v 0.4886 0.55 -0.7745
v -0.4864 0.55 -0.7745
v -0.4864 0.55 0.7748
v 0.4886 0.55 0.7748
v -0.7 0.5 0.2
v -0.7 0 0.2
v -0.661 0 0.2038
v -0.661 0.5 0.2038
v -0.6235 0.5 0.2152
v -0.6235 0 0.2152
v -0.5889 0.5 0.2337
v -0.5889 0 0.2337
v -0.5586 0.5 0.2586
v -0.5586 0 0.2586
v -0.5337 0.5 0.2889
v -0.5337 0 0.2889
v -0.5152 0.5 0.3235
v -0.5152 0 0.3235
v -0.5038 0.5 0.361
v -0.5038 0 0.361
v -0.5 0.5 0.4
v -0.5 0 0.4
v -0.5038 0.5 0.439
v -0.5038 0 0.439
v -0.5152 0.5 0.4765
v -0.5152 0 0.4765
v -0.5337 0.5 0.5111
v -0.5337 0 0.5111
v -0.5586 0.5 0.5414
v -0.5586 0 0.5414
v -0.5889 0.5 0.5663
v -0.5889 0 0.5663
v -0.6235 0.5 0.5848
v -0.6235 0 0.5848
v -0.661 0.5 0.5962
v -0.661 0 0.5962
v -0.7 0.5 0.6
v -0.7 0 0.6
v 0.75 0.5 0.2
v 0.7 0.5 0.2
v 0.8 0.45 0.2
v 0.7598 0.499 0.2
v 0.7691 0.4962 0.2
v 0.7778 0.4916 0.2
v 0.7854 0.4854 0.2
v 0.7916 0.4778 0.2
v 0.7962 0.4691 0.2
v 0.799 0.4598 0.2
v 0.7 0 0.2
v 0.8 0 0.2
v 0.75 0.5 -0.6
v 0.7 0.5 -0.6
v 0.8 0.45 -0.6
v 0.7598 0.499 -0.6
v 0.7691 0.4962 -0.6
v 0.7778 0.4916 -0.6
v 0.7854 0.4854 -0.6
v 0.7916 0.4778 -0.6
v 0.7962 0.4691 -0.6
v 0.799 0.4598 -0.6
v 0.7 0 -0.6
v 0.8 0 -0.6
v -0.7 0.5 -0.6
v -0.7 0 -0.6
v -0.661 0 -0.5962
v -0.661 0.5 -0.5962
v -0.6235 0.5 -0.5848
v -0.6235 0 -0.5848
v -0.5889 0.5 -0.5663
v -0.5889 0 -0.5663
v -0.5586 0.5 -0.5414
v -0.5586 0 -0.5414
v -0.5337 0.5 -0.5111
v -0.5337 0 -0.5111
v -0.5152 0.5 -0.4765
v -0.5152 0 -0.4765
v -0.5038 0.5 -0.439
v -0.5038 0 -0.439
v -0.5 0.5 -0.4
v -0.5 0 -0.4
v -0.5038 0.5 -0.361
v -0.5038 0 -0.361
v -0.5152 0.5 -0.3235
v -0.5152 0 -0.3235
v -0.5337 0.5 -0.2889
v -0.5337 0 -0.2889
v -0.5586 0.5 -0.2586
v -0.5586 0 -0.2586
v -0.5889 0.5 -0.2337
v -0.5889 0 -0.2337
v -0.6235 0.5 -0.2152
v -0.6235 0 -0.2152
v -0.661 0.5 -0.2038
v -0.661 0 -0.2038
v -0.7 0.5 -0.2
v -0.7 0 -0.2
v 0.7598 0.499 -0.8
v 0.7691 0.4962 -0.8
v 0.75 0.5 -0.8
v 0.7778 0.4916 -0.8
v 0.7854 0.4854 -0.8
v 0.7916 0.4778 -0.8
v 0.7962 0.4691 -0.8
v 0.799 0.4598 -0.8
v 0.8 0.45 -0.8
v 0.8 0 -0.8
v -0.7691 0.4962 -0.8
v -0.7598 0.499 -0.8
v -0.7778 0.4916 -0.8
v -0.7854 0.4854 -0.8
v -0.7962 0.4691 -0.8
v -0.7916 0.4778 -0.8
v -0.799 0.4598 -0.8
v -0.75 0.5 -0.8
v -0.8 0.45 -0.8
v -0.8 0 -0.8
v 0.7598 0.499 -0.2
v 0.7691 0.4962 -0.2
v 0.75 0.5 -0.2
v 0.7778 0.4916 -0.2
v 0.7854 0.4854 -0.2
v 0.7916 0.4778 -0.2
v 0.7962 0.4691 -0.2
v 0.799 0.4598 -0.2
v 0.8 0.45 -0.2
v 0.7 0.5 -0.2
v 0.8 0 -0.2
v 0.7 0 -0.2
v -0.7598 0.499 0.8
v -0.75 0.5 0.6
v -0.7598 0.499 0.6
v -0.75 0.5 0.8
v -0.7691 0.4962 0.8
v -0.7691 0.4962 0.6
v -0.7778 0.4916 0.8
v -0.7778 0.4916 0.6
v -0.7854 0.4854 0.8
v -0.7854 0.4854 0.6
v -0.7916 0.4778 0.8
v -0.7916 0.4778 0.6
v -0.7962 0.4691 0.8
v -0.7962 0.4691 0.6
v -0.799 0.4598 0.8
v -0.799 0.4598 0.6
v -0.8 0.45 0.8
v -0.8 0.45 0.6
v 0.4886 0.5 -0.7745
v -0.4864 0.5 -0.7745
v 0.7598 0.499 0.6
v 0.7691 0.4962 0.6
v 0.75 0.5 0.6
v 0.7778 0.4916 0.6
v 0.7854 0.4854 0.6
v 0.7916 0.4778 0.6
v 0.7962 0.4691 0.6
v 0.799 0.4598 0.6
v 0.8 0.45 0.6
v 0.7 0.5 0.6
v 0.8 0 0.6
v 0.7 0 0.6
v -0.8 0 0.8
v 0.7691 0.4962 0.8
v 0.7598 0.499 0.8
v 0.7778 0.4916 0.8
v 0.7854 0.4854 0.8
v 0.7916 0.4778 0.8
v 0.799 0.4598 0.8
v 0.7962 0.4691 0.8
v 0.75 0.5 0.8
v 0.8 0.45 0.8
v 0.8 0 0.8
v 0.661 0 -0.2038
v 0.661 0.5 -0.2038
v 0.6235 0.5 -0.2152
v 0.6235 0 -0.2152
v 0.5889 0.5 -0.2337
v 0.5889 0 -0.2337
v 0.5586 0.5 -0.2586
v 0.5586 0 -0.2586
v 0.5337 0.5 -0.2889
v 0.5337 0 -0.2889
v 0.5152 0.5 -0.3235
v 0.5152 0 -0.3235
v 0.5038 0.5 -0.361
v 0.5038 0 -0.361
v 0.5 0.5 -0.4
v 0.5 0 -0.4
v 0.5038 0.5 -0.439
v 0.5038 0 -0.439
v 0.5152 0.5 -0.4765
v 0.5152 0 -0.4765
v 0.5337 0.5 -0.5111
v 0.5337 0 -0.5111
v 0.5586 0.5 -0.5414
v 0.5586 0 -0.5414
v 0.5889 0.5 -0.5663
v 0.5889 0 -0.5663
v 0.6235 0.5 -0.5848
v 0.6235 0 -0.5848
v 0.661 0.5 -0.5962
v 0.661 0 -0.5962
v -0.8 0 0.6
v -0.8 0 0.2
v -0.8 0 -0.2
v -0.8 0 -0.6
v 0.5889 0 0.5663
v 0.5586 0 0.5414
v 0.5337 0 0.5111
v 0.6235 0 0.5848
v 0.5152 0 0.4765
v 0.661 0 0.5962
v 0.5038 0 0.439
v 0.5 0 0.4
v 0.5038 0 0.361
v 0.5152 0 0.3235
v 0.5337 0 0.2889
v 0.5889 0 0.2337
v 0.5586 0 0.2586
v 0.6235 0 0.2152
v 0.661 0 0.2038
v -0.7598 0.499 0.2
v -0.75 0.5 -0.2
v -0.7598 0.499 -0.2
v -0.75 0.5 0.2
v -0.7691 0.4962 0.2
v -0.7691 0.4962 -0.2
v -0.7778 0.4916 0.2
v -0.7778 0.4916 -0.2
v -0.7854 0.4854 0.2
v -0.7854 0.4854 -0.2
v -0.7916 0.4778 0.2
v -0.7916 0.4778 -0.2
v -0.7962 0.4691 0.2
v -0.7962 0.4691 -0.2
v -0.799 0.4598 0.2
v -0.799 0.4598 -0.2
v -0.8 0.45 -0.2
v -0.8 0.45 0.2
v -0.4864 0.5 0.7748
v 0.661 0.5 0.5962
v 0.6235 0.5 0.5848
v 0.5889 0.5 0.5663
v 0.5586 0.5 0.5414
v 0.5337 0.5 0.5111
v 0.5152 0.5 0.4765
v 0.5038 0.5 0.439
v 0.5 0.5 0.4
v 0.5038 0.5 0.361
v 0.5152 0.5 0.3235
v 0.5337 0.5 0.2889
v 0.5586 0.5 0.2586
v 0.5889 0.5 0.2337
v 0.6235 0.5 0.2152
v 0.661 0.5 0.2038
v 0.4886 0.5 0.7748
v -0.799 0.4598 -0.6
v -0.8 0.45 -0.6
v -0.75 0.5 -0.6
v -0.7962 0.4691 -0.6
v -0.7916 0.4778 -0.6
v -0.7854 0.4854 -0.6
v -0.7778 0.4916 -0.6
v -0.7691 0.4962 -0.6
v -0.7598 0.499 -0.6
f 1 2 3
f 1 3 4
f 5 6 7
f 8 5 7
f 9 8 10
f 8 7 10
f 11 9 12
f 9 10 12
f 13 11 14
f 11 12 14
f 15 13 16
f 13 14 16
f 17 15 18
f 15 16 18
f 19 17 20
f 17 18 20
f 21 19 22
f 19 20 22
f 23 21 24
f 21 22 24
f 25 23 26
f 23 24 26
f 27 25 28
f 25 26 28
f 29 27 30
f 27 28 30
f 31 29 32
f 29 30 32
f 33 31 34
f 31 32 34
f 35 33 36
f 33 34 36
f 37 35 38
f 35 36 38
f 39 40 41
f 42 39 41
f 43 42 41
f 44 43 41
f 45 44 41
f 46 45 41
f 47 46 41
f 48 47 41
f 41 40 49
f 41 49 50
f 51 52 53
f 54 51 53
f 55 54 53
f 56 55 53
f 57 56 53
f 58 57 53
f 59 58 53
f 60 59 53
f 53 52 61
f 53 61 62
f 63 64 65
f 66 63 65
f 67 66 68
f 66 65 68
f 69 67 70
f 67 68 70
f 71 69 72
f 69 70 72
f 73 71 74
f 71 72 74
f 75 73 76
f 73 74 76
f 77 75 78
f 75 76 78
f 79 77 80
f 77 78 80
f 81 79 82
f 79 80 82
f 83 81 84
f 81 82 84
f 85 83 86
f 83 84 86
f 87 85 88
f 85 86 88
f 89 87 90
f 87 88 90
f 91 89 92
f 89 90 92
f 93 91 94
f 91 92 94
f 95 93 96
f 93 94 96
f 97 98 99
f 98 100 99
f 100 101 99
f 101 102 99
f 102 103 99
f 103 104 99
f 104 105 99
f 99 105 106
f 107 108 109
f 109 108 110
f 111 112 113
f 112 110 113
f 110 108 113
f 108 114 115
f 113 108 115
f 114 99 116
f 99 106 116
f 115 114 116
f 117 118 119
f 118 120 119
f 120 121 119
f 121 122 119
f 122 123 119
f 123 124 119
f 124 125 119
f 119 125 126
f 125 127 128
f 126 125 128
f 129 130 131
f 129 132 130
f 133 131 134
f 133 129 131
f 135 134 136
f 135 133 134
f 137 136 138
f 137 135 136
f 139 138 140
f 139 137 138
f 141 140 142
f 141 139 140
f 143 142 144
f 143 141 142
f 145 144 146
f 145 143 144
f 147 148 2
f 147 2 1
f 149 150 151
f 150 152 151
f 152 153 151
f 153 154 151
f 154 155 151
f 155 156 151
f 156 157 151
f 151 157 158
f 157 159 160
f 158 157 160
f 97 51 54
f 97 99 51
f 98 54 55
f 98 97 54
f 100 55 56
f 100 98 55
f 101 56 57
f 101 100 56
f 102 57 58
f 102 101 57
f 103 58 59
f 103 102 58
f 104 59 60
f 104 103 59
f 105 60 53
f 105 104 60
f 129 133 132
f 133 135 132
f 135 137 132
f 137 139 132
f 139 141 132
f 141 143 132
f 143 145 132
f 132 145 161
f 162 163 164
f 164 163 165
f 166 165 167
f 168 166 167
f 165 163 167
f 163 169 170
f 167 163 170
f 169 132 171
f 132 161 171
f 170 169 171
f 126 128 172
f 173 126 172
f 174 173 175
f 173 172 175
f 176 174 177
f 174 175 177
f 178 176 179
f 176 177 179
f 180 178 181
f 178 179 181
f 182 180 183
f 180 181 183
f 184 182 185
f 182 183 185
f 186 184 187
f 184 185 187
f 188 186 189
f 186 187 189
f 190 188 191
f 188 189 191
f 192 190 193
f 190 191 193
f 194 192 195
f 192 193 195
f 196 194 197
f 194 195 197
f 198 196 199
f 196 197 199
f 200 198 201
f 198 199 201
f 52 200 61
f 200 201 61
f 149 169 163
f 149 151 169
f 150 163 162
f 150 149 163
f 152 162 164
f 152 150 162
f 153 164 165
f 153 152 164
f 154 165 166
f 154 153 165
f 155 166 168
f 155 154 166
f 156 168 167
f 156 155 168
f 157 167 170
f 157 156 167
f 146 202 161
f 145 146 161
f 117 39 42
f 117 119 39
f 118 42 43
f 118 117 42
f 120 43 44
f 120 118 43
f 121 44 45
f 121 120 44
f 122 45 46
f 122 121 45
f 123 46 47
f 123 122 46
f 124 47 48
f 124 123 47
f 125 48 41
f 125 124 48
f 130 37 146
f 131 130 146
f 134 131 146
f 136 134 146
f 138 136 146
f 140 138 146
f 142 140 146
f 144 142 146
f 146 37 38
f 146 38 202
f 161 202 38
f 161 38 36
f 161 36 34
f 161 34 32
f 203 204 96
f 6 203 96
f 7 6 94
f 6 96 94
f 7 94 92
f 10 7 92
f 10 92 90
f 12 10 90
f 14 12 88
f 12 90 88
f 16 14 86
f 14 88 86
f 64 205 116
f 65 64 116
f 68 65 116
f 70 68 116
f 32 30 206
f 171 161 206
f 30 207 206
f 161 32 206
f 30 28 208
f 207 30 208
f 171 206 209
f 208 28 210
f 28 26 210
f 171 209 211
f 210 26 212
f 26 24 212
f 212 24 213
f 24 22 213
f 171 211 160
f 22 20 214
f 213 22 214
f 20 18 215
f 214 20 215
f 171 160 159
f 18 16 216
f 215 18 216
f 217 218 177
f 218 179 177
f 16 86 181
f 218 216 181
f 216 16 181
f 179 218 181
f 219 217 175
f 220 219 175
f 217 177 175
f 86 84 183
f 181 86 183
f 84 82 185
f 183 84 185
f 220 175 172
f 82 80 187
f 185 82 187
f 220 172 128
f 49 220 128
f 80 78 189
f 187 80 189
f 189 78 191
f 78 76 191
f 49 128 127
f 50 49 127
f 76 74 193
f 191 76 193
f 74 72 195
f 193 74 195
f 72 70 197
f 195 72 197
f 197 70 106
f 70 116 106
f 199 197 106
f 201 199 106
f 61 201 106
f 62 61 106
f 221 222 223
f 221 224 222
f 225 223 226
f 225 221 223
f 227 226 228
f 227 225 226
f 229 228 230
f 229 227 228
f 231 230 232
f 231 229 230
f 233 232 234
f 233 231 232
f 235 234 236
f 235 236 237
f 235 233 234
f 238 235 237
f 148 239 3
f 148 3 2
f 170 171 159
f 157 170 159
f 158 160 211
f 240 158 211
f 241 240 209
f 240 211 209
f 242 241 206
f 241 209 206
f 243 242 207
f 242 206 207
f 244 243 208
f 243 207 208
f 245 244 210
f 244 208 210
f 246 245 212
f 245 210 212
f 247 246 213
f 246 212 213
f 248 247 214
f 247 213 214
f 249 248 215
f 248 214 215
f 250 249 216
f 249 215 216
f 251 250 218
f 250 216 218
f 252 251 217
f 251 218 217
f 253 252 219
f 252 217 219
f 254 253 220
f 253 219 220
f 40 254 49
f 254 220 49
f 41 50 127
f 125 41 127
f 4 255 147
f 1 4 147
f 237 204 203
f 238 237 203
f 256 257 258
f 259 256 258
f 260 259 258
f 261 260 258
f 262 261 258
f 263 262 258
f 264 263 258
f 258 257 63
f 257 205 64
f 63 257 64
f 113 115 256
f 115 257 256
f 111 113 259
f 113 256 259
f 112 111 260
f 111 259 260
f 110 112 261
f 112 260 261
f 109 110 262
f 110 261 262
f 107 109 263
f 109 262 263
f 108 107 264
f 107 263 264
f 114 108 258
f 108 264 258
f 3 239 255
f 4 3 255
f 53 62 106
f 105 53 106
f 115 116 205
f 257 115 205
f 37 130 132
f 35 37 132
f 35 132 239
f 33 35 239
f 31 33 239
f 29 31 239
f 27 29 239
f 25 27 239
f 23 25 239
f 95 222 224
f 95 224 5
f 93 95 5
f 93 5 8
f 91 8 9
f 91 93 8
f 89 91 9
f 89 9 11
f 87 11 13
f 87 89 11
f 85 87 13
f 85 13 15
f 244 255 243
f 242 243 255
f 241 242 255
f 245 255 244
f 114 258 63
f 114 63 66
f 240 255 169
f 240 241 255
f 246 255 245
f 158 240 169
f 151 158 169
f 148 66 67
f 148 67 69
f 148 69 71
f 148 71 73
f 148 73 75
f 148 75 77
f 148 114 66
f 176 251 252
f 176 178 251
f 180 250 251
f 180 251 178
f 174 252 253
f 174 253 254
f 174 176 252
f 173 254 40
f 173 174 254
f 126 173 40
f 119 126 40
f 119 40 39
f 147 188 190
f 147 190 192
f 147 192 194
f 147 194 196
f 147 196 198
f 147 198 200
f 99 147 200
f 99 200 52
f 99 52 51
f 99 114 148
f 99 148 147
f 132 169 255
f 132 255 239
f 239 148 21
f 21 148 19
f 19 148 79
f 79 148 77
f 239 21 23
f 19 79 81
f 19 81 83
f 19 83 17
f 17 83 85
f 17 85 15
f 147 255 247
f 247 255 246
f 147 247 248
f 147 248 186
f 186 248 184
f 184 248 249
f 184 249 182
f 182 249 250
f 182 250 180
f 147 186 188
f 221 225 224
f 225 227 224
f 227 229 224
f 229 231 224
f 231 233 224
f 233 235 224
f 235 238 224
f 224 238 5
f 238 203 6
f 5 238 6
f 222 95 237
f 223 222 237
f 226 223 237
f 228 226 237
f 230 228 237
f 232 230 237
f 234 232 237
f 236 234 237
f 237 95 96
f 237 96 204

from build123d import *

# Parameters (mm, degrees)
BOSS_EXTRUDE1_DEPTH = 0.5
SKETCH2_W           = 0.974965632
SKETCH2_H           = 1.549329334
BOSS_EXTRUDE2_DEPTH = 0.05
FILLET2_R           = 0.05


with BuildPart() as part:
    # Sketch1 → Boss-Extrude1 (new body)
    with BuildSketch(Plane(origin=(0, 0, 0), x_dir=(1, 0, 0), z_dir=(0, 1, 0))):
        with BuildLine():
            Line((-0.8, 0.8), (-0.8, 0.6))
            Line((-0.8, 0.6), (-0.7, 0.6))
            ThreePointArc((-0.7, 0.6), (-0.5, 0.4), (-0.7, 0.2))
            Line((-0.7, 0.2), (-0.8, 0.2))
            Line((-0.8, 0.2), (-0.8, -0.2))
            Line((-0.8, -0.2), (-0.7, -0.2))
            ThreePointArc((-0.7, -0.2), (-0.5, -0.4), (-0.7, -0.6))
            Line((-0.7, -0.6), (-0.8, -0.6))
            Line((-0.8, -0.6), (-0.8, -0.8))
            Line((-0.8, -0.8), (0.8, -0.8))
            Line((0.8, -0.8), (0.8, -0.6))
            Line((0.8, -0.6), (0.7, -0.6))
            ThreePointArc((0.7, -0.6), (0.5, -0.4), (0.7, -0.2))
            Line((0.7, -0.2), (0.8, -0.2))
            Line((0.8, -0.2), (0.8, 0.2))
            Line((0.8, 0.2), (0.7, 0.2))
            ThreePointArc((0.7, 0.2), (0.5, 0.4), (0.7, 0.6))
            Line((0.7, 0.6), (0.8, 0.6))
            Line((0.8, 0.6), (0.8, 0.8))
            Line((0.8, 0.8), (-0.8, 0.8))
        make_face()
    extrude(amount=BOSS_EXTRUDE1_DEPTH)

    # Sketch2 → Boss-Extrude2 (add)
    with BuildSketch(Plane(origin=(0, 0.5, 0), x_dir=(1, 0, 0), z_dir=(0, 1, 0))):
        with Locations((0.001088626, -0.000183017)):
            Rectangle(SKETCH2_W, SKETCH2_H)
    extrude(amount=BOSS_EXTRUDE2_DEPTH)

    # Fillet2
    fillet2_edges = [part.edges().sort_by_distance(p)[0] for p in [
        (-0.8, 0.5, 0),
        (-0.8, 0.5, 0.7),
        (0.8, 0.5, 0.7),
        (0.8, 0.5, 0),
        (0.8, 0.5, -0.7),
        (-0.8, 0.5, -0.7),
    ]]
    fillet(fillet2_edges, radius=FILLET2_R)


solid = part.part
